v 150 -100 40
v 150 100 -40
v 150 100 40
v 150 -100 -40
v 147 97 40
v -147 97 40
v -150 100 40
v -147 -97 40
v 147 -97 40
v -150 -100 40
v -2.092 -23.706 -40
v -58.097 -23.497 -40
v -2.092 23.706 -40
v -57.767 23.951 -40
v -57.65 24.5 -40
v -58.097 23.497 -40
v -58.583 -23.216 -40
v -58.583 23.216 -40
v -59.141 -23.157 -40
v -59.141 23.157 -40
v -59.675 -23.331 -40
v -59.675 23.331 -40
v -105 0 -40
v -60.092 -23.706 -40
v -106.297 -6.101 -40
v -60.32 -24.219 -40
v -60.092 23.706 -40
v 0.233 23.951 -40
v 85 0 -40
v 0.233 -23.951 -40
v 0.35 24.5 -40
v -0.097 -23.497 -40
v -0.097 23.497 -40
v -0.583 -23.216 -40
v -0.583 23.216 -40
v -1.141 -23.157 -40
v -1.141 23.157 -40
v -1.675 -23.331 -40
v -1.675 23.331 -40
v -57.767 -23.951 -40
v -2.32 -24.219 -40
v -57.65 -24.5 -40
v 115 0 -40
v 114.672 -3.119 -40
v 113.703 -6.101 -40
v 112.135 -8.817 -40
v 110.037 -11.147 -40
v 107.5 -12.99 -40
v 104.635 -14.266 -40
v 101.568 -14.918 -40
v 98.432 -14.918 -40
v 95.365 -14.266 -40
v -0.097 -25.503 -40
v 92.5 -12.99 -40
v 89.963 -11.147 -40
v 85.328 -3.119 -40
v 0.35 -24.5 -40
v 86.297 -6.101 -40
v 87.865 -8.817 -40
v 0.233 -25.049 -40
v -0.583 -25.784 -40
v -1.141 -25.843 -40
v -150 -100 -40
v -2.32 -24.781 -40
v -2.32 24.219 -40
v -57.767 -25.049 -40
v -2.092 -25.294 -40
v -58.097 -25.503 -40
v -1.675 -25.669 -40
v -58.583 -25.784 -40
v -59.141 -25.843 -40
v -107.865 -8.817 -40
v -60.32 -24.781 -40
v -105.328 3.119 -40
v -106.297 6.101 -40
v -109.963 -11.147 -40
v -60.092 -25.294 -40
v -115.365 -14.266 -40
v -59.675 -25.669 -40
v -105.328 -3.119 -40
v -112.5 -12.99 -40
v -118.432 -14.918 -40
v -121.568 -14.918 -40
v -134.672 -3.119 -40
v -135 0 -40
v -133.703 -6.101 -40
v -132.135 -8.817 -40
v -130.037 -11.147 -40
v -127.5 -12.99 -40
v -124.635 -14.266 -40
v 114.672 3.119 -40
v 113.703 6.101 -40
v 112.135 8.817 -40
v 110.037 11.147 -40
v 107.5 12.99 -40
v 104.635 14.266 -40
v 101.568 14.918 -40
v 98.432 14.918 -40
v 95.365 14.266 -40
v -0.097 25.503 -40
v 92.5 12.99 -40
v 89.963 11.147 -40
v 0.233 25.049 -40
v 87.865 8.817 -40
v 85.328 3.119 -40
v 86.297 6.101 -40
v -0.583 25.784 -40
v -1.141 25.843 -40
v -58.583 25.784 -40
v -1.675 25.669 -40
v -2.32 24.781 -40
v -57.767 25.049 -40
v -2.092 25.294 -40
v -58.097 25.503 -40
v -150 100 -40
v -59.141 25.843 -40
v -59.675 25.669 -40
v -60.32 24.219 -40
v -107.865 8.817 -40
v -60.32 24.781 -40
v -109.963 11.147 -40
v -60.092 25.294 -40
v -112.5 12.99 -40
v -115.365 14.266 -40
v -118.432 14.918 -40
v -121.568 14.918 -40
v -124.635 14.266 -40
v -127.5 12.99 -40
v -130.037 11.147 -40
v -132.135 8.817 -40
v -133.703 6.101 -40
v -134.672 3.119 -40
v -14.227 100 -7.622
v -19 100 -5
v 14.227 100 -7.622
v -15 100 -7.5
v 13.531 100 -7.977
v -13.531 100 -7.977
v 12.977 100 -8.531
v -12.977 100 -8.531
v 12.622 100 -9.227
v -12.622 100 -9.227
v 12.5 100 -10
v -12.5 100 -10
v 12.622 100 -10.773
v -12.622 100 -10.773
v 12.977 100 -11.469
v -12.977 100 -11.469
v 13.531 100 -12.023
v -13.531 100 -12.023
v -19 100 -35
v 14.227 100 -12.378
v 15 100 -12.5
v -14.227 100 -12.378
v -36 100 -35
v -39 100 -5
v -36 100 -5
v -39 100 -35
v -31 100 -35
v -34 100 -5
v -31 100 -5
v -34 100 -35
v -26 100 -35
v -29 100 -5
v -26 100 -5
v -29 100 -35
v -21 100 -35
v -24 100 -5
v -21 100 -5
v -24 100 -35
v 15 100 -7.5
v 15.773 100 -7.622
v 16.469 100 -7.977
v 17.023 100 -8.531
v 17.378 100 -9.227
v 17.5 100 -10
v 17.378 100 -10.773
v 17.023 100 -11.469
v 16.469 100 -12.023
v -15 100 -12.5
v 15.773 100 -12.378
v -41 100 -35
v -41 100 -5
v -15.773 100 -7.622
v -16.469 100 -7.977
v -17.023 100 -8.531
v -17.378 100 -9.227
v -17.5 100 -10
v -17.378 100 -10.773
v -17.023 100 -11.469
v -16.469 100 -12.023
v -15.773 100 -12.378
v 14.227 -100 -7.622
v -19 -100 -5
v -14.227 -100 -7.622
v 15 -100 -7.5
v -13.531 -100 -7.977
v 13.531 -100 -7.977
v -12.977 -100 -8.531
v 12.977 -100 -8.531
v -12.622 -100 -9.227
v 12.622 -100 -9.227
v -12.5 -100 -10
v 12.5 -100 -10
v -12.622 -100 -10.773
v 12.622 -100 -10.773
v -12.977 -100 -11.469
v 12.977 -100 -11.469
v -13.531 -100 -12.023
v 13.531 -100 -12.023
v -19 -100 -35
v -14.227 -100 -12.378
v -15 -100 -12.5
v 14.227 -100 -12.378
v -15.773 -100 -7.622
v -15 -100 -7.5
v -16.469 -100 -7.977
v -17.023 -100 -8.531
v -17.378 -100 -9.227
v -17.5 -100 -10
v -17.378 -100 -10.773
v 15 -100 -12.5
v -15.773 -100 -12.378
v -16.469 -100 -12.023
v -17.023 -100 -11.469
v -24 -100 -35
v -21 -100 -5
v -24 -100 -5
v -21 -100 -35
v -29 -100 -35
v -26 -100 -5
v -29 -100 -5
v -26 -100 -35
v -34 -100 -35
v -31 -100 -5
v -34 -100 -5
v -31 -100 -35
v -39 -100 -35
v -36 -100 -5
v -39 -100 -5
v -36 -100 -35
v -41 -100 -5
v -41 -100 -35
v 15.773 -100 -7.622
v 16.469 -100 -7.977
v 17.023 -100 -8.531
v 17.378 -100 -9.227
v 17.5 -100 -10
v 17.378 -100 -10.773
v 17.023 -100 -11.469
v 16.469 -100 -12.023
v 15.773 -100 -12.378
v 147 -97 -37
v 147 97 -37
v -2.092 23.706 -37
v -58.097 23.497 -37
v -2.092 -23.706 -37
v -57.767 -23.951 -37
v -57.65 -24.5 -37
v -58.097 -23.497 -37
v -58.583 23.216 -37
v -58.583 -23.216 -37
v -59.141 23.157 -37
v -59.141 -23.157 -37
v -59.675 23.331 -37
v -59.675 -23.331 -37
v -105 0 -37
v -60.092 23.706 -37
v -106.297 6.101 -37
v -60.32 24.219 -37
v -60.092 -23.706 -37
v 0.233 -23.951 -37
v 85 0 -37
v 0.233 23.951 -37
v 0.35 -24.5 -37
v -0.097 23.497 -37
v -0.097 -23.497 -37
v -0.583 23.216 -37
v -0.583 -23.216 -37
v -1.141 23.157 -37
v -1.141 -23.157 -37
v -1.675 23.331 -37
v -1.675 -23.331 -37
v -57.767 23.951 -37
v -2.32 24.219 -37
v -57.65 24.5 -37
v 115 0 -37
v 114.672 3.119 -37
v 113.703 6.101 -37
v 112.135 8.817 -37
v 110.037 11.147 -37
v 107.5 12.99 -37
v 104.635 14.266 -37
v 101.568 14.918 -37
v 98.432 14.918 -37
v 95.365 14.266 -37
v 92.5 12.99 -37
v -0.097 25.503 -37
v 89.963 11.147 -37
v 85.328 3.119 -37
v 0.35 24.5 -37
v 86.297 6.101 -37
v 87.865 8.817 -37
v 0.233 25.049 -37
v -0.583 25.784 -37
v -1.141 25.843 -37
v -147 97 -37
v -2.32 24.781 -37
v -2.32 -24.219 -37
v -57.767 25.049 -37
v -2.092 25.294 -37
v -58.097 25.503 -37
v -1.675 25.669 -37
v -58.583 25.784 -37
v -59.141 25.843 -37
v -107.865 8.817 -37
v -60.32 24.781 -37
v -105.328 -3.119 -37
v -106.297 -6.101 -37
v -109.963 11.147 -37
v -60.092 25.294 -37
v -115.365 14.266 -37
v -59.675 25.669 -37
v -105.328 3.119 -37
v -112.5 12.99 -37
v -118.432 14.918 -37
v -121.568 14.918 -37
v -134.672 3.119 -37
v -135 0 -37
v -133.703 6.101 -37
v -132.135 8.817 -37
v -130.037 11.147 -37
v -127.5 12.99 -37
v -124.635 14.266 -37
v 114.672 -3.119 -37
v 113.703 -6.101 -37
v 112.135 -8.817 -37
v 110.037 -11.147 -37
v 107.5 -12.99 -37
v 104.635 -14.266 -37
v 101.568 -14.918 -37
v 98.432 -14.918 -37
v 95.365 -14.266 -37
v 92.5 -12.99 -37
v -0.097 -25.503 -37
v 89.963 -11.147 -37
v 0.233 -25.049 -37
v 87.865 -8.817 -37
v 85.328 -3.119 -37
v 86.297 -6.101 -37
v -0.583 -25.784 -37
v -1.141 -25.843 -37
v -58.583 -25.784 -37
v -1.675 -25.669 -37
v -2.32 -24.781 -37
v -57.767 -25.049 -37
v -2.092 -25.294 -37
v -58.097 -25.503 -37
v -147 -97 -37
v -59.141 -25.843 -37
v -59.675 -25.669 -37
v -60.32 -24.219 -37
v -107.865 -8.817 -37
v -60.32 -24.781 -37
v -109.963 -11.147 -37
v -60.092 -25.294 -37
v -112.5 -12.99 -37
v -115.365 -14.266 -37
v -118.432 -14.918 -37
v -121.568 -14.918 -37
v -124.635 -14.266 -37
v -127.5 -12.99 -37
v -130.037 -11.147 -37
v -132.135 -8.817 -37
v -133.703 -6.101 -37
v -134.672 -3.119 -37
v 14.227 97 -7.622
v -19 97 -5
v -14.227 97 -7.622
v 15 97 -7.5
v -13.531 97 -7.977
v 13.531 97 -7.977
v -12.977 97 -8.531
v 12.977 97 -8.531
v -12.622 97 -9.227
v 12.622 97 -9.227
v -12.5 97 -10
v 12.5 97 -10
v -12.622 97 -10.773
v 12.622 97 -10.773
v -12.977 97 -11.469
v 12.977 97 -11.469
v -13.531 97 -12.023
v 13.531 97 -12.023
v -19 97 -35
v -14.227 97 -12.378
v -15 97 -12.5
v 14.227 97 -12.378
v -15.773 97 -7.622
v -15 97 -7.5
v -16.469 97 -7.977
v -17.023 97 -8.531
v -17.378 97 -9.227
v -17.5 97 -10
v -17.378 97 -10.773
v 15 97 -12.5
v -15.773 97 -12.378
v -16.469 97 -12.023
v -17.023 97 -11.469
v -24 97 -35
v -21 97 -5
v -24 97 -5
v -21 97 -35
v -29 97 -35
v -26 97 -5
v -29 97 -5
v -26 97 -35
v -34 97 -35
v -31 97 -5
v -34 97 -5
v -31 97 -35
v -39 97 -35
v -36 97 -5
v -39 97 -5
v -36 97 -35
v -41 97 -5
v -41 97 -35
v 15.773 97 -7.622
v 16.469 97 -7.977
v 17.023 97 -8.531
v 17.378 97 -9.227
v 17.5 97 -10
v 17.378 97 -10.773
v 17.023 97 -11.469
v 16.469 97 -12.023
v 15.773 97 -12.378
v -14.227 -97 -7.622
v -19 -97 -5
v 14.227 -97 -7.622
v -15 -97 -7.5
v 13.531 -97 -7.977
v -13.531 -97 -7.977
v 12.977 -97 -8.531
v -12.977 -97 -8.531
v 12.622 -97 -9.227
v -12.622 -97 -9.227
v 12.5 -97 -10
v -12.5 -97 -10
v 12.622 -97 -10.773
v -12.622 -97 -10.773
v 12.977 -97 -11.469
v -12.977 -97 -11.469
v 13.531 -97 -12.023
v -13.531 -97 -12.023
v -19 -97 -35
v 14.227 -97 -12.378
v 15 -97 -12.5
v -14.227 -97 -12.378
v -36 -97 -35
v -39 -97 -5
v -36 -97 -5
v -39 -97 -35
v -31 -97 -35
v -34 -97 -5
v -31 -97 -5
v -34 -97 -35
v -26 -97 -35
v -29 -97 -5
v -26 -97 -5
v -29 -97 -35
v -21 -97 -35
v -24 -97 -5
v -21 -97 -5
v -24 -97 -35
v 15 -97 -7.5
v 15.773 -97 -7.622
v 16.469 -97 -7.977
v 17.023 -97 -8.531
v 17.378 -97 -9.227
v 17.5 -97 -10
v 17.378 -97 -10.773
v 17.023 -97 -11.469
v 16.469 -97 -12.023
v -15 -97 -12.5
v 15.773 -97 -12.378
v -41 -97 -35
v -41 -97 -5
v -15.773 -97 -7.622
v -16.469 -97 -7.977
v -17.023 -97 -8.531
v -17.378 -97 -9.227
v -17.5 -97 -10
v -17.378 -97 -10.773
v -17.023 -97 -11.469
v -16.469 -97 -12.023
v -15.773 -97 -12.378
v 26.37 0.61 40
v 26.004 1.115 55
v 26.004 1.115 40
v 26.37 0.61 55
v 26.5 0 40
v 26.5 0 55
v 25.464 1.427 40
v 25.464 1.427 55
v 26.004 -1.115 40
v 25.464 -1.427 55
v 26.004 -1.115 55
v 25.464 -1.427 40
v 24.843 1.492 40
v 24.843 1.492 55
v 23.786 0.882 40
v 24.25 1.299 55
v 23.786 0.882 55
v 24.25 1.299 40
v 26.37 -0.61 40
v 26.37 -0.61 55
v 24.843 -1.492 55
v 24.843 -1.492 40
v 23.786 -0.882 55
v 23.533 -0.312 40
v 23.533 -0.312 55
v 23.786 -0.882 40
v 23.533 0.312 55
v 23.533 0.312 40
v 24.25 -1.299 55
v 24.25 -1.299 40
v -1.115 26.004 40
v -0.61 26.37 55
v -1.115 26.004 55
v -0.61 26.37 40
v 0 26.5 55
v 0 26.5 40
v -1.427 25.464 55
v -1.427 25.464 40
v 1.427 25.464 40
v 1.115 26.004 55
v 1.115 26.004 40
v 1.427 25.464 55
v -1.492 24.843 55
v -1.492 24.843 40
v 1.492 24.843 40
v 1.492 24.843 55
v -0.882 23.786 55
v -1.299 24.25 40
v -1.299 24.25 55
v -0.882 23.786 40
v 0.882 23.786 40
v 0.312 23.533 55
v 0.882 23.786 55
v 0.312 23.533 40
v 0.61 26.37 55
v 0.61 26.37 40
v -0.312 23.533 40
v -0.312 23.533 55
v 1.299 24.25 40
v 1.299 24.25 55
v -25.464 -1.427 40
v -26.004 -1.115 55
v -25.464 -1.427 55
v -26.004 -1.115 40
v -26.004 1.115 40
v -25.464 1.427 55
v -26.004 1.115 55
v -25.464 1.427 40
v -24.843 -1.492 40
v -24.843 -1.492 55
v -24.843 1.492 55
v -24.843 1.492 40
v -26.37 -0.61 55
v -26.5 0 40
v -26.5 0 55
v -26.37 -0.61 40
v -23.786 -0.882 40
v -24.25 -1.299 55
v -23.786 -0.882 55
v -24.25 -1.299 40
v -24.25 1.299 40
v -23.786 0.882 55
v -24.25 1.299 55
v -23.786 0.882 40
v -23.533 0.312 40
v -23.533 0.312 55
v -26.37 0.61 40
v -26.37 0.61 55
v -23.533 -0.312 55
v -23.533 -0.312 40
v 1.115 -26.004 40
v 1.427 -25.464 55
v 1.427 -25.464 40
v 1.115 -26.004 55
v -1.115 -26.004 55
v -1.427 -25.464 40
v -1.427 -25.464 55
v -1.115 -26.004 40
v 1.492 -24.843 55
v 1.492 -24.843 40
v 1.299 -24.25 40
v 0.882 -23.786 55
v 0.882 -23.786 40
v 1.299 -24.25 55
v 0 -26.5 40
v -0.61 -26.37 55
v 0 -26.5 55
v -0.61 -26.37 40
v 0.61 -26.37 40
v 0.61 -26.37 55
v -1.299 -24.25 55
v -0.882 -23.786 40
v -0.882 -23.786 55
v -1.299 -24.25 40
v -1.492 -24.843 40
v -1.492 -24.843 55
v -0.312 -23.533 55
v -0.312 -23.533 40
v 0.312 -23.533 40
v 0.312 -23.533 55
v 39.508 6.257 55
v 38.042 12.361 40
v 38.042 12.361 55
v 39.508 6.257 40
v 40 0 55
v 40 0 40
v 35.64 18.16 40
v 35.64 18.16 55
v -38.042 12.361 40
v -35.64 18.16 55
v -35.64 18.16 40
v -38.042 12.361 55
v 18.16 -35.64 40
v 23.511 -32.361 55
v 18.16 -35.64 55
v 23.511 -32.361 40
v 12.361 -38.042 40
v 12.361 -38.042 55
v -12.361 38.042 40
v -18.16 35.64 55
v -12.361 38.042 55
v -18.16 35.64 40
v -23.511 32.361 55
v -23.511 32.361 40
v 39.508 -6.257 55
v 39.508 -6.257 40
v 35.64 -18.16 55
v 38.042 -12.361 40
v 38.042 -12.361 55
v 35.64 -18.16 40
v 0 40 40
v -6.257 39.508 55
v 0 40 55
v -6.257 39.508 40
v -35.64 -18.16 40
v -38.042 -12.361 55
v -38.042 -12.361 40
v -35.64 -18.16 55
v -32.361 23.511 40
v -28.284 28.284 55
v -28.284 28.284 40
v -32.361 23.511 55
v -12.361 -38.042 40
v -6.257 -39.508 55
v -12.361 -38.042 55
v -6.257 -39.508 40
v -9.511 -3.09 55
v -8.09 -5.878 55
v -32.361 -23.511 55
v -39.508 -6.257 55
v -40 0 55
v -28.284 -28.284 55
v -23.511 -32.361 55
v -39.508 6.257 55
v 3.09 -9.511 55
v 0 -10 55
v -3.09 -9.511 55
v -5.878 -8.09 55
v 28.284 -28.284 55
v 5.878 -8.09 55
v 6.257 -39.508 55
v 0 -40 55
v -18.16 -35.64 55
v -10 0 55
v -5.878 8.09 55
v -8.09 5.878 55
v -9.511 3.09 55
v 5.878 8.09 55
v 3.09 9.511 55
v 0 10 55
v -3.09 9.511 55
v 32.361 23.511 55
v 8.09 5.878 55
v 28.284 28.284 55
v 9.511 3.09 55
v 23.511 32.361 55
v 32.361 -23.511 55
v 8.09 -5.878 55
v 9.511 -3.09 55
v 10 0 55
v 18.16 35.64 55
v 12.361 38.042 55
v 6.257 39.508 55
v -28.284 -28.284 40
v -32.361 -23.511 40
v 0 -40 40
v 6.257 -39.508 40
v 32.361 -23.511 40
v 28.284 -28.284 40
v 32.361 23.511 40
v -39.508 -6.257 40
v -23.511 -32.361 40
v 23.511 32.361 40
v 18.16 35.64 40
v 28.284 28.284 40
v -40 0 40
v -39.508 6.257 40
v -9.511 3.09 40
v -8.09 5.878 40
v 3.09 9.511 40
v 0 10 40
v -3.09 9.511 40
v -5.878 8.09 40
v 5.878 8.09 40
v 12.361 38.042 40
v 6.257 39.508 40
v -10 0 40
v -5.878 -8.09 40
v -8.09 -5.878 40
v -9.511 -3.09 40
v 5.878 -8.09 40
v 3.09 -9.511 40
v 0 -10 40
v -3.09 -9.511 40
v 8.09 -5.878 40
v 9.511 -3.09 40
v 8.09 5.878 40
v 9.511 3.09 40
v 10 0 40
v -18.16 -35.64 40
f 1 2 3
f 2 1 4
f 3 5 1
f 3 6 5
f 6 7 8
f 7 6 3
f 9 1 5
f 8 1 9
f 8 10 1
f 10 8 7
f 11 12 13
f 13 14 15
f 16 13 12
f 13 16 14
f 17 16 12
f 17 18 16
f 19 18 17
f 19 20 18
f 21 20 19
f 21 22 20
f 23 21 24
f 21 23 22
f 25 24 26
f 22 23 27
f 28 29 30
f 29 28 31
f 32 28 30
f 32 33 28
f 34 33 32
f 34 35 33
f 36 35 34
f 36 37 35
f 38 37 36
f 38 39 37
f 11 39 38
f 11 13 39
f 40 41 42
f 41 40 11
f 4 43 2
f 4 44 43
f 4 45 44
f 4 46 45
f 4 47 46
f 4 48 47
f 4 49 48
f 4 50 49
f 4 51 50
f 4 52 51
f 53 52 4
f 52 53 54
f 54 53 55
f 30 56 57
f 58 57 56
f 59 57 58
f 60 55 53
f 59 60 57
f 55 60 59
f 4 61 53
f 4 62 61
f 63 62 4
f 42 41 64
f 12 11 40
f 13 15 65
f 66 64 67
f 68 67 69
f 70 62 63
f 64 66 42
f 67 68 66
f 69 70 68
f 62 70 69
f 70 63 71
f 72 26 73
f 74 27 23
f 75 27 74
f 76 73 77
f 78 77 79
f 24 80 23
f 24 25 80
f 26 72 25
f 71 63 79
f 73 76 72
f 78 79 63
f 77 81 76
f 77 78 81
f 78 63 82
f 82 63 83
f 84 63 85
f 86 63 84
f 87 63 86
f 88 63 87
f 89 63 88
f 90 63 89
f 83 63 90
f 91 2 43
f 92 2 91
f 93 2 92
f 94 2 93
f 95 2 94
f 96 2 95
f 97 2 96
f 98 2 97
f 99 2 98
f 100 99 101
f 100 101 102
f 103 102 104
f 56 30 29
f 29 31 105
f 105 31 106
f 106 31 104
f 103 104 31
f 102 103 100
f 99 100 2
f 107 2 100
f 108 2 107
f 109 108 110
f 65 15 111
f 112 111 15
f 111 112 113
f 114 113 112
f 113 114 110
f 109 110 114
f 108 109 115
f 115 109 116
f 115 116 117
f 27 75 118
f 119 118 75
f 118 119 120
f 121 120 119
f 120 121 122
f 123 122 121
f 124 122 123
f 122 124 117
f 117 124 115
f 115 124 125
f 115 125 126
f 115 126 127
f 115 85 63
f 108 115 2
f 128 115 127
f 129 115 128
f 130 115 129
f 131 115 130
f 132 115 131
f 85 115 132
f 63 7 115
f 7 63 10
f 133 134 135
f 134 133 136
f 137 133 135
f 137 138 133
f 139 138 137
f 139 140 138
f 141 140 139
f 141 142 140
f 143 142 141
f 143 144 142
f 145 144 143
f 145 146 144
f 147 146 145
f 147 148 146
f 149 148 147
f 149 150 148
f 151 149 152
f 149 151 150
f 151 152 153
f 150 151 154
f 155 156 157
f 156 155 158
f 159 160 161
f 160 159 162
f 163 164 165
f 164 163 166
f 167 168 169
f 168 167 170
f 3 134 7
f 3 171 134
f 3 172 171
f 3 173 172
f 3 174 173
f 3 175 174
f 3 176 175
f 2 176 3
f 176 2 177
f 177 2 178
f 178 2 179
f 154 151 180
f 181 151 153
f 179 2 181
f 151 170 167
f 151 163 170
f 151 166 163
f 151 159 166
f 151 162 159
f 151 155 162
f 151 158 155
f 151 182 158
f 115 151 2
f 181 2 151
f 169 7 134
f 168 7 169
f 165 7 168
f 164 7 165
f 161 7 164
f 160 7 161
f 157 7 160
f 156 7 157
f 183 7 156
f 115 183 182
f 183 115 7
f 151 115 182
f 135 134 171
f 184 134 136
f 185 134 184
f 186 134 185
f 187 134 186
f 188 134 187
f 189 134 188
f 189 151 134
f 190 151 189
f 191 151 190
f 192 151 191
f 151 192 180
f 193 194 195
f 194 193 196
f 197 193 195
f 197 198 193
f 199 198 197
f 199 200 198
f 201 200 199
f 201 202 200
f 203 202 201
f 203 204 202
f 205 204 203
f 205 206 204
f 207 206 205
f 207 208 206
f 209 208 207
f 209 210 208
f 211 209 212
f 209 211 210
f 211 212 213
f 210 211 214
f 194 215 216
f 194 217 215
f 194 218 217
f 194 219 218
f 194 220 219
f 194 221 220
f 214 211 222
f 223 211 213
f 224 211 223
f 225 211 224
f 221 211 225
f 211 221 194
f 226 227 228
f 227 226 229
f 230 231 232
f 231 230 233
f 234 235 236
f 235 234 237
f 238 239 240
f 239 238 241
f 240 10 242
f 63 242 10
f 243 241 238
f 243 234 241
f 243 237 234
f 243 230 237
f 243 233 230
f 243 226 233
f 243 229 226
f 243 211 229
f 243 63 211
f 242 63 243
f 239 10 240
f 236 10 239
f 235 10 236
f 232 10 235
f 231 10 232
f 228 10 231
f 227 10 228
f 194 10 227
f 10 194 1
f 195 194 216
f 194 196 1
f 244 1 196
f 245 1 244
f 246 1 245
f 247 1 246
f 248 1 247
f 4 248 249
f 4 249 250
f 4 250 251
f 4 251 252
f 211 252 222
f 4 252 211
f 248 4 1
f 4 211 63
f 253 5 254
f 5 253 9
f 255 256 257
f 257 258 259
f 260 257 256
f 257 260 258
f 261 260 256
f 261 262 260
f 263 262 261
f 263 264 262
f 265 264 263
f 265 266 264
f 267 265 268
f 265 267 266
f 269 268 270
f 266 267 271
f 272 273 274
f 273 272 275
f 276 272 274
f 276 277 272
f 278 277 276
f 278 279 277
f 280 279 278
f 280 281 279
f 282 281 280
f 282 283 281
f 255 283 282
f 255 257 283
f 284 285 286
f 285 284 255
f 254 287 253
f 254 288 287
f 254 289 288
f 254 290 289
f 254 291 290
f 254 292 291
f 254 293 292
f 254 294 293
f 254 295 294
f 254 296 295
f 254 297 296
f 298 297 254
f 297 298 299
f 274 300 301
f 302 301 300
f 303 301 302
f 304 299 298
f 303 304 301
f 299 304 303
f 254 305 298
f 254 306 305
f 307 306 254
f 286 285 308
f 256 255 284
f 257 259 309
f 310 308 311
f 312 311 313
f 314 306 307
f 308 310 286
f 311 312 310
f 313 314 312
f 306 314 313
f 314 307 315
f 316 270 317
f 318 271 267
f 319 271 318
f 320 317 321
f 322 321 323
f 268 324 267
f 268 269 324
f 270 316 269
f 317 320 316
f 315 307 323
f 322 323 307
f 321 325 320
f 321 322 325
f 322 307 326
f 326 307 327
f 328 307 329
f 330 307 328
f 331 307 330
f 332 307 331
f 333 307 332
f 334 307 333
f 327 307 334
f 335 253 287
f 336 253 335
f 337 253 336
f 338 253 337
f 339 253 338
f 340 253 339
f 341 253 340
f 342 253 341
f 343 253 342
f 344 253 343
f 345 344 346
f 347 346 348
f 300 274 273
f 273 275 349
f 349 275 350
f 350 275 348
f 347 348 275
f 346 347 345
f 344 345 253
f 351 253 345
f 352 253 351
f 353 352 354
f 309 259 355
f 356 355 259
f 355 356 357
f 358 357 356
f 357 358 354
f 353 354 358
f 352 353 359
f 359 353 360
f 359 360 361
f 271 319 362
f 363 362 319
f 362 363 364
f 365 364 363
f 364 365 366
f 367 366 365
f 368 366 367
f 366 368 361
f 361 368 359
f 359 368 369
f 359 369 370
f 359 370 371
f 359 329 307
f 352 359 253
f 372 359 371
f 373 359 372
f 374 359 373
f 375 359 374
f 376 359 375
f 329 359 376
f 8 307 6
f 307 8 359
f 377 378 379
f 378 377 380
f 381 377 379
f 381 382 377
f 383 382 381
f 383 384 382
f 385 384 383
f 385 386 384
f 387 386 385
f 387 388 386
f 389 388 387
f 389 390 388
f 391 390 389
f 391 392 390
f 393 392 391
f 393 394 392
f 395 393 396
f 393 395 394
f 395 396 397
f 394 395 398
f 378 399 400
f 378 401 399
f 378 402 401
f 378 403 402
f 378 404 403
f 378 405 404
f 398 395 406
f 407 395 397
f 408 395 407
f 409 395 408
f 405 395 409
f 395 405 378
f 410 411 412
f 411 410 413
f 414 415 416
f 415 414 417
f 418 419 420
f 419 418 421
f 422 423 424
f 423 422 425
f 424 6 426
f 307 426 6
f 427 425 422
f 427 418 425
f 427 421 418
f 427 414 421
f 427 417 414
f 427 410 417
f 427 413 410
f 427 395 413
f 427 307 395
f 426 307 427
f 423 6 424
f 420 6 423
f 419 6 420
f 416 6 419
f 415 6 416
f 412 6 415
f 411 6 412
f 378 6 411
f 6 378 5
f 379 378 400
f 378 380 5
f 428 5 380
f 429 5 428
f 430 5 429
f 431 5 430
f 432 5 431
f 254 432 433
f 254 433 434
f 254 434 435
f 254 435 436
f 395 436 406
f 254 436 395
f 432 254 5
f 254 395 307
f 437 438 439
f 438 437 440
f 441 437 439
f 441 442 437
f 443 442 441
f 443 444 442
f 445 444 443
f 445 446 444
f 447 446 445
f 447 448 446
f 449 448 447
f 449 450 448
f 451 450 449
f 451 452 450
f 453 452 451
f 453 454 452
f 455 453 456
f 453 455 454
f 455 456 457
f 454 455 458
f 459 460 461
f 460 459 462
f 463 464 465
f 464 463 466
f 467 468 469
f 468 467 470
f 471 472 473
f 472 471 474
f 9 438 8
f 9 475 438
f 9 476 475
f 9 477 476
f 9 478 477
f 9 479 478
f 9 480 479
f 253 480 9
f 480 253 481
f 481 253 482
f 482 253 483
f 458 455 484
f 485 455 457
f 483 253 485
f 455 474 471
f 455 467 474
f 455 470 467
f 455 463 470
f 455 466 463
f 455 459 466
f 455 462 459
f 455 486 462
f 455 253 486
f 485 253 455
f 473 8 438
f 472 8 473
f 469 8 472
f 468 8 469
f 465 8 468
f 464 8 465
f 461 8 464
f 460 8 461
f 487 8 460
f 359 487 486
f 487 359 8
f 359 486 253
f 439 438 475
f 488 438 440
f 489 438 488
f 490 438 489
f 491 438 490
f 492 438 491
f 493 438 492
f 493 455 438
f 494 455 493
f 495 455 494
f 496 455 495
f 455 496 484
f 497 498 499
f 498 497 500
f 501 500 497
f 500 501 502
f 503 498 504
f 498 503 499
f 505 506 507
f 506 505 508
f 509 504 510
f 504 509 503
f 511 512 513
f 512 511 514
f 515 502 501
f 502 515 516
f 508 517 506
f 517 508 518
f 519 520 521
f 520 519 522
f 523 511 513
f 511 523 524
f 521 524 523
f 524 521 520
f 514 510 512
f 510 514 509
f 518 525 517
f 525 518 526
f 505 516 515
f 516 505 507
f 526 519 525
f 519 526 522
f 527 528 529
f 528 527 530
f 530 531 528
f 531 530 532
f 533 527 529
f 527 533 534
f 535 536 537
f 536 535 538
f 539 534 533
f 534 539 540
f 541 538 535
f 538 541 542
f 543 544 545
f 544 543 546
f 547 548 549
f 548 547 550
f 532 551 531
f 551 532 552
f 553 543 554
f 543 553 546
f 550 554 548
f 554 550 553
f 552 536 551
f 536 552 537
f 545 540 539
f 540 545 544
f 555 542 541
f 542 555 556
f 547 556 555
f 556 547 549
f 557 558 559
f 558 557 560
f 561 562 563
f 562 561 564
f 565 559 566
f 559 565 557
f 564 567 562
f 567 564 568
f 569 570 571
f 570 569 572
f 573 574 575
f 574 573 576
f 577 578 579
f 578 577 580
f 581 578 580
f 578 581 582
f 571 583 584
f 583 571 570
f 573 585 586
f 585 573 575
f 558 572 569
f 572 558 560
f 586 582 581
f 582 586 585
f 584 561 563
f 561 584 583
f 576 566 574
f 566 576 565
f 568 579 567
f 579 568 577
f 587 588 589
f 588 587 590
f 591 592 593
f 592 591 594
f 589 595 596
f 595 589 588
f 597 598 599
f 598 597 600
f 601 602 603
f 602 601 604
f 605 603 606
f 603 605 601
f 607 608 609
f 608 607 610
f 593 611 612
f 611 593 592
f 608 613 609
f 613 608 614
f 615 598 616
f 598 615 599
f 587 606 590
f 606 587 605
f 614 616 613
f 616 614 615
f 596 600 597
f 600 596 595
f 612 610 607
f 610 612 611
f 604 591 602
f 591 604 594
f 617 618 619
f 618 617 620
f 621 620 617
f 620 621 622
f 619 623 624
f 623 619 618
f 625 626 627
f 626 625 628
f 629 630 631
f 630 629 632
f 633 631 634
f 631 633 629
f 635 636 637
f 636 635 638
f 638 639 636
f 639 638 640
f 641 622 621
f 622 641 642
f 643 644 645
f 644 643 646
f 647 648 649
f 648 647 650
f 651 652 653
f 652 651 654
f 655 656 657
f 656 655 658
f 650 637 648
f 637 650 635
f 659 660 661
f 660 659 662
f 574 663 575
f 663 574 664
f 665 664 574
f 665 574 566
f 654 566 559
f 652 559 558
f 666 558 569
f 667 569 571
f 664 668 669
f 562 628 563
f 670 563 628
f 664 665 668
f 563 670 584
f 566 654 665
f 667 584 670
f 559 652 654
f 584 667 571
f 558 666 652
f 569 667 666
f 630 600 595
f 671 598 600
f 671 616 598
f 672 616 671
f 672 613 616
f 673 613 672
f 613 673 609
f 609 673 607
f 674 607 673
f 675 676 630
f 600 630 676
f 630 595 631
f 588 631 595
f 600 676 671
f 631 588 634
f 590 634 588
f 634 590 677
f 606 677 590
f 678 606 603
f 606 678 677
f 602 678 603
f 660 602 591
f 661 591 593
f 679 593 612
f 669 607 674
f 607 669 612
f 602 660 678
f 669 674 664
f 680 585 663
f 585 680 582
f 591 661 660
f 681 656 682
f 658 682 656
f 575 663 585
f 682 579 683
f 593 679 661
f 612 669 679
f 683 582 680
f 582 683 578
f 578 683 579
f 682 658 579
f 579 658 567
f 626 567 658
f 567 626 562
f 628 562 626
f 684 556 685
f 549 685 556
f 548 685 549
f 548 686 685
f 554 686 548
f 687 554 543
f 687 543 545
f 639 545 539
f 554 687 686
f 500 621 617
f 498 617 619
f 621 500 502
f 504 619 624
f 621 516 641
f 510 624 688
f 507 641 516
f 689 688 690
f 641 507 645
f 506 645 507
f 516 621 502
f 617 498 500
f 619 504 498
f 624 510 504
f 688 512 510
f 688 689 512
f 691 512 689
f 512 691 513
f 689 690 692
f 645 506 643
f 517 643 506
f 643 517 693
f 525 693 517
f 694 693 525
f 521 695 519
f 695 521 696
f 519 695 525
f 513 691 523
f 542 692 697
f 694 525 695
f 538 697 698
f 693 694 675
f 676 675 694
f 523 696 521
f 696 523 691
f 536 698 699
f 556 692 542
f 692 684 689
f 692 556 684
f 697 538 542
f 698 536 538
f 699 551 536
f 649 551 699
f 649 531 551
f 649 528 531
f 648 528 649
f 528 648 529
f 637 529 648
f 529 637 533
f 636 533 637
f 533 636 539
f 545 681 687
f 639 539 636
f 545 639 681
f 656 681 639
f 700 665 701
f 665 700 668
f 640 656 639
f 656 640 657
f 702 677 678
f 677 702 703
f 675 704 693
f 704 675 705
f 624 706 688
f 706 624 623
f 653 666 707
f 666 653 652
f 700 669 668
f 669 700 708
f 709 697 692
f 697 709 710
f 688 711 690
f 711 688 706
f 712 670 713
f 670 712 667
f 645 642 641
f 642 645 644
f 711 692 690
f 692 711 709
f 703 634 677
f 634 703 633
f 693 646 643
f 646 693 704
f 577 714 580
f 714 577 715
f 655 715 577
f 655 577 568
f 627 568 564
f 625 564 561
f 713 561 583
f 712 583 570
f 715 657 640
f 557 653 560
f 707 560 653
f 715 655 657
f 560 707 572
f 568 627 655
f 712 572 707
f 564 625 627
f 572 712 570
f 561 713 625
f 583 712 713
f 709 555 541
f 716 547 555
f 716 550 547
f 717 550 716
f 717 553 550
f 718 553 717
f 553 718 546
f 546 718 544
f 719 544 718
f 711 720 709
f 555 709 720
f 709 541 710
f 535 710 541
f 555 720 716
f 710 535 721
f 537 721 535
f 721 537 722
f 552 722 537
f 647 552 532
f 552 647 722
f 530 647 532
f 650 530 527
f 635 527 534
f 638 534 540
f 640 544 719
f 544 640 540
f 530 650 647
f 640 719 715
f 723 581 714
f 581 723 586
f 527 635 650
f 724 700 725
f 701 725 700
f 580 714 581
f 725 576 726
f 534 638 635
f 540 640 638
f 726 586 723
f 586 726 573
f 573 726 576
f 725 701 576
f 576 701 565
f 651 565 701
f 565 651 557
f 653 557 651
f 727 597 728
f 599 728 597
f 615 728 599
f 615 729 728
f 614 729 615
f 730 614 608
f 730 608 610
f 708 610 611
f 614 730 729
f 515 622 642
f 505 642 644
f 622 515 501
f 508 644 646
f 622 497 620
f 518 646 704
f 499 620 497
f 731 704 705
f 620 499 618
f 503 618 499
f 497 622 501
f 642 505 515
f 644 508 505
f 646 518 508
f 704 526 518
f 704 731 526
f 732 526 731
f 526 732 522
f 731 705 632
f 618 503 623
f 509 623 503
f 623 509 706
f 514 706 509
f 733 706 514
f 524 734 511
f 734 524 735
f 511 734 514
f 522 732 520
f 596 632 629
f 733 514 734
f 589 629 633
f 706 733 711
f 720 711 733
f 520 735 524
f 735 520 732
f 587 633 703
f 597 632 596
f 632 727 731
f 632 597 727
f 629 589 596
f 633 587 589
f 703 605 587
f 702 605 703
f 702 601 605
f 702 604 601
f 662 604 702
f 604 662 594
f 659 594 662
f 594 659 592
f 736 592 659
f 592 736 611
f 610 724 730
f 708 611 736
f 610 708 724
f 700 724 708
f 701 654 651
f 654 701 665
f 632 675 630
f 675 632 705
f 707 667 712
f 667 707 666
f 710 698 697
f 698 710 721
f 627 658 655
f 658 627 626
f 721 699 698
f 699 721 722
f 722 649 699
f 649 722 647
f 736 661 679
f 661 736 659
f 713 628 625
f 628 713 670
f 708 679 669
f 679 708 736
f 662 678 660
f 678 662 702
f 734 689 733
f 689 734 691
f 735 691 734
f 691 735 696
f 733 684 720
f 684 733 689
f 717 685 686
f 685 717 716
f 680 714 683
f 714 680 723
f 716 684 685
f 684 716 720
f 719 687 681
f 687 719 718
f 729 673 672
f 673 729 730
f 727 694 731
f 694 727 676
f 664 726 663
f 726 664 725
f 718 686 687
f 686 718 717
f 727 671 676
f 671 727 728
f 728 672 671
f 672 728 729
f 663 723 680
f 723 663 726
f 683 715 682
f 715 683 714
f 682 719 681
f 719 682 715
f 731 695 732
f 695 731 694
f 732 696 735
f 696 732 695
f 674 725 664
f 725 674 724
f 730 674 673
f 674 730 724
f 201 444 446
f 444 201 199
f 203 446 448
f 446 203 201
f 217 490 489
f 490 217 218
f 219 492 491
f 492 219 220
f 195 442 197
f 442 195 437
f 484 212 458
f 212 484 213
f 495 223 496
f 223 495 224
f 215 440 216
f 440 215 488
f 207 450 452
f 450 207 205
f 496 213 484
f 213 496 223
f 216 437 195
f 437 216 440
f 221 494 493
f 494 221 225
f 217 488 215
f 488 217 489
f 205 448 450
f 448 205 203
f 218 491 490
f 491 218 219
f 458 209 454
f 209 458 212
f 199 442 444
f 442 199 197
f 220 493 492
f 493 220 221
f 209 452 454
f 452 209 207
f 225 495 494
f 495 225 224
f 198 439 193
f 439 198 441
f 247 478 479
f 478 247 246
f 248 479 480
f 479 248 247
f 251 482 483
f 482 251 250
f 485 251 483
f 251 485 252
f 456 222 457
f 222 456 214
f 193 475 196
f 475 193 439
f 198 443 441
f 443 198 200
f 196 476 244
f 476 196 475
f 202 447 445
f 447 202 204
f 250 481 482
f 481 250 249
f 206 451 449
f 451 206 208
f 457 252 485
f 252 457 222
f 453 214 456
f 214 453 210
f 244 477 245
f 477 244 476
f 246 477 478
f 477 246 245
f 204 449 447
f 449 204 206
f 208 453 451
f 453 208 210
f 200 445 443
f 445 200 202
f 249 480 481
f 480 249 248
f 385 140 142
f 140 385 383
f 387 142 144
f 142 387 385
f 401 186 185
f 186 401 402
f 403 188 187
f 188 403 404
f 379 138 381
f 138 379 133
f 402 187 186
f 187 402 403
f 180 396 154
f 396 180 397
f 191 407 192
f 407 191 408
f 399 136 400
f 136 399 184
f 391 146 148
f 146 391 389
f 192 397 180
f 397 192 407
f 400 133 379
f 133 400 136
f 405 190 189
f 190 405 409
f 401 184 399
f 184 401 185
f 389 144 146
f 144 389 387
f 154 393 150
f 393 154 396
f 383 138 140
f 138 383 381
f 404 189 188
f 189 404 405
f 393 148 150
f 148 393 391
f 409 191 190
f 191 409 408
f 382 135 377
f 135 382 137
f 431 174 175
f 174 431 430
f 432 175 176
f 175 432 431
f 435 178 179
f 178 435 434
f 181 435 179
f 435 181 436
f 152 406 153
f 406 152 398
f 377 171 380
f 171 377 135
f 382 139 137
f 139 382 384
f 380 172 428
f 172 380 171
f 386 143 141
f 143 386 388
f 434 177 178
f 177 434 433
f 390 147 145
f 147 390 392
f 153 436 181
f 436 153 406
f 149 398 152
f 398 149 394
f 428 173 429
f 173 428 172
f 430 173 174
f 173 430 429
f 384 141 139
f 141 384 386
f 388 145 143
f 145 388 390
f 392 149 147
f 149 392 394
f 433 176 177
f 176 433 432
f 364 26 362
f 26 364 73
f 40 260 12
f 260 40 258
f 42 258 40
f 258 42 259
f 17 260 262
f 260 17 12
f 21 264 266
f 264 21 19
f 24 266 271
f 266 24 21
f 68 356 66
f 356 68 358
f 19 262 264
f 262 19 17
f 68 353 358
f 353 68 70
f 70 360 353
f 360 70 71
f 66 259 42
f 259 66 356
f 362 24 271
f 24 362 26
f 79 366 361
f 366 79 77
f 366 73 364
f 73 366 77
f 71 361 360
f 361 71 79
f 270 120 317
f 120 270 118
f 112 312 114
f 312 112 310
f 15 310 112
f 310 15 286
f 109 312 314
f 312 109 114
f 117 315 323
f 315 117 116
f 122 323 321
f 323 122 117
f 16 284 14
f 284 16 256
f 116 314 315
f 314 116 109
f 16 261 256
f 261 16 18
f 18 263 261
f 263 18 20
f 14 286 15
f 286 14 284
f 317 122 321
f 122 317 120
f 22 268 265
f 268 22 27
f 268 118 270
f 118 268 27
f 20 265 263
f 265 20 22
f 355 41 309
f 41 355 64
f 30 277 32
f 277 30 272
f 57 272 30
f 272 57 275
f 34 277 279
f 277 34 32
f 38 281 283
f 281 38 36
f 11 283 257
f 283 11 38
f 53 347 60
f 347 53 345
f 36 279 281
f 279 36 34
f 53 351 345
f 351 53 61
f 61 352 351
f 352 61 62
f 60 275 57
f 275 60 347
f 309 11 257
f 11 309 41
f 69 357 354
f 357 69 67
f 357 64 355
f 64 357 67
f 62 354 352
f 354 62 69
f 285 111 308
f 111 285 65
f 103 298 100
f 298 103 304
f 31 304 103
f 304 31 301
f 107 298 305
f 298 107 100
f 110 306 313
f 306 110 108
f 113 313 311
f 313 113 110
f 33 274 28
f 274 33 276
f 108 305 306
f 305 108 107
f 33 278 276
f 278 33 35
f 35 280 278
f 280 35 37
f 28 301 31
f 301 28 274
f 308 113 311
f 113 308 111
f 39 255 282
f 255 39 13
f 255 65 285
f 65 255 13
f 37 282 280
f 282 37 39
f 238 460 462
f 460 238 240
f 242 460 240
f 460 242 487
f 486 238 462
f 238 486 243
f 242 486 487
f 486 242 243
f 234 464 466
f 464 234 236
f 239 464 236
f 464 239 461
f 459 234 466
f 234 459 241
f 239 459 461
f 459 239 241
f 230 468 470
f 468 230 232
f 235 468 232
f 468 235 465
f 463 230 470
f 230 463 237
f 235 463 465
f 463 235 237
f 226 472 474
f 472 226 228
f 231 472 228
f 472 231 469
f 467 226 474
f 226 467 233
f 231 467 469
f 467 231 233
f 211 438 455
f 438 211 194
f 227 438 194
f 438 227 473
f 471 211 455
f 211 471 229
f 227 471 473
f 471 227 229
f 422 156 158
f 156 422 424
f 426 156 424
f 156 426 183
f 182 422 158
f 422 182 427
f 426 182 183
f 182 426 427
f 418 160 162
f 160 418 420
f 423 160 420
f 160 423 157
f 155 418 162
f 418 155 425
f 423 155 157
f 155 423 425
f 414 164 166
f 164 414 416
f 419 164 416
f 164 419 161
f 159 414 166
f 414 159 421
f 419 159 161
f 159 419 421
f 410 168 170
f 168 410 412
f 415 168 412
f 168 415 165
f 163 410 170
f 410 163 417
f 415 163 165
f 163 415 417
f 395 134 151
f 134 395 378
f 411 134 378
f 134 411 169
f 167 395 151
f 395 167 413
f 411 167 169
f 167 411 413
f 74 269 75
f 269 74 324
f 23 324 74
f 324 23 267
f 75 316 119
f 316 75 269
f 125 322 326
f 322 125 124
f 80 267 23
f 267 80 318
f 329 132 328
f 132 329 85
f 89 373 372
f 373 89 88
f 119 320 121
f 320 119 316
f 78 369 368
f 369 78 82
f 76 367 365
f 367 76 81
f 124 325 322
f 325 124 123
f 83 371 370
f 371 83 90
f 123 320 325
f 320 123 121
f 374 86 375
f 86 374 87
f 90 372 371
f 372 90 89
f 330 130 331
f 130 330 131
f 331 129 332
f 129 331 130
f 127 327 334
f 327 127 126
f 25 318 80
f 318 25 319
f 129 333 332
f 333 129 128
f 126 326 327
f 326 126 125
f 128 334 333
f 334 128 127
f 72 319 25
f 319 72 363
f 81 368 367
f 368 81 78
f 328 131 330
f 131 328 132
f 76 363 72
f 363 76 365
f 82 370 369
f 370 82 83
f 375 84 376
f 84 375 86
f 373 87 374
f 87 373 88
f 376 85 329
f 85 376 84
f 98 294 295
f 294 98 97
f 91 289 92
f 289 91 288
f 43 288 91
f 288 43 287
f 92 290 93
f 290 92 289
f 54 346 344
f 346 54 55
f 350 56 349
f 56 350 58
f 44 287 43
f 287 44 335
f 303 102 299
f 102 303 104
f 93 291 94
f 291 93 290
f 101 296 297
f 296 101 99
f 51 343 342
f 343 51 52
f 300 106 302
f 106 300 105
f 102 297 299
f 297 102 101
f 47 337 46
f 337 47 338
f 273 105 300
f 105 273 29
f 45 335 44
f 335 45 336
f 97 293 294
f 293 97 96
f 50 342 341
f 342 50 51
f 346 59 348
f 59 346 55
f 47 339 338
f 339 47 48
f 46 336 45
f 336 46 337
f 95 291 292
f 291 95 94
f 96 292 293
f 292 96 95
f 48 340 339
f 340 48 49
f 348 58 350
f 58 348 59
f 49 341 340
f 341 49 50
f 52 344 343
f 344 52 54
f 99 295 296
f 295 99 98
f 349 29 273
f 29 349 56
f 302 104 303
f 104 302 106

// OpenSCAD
/**
 * ============================================================================
 * grass-chopper シャーシ (OpenSCAD パラメトリックモデル)
 * ============================================================================
 * URDF (robot_description.urdf.xacro) の寸法と一致させた
 * 3D プリント用シャーシモデル。
 *
 * 使い方:
 *   1. OpenSCAD でこのファイルを開く
 *   2. パラメータを調整
 *   3. F6 (レンダリング) → File → Export as STL
 *
 * プリント設定 (推奨):
 *   - 素材: ASA (屋外) or PETG (屋内テスト)
 *   - 壁厚: 4〜6 層 (0.4mm ノズルなら 1.6〜2.4mm)
 *   - インフィル: 20% (三角形パターン)
 *   - レイヤー高さ: 0.2mm
 * ============================================================================
 */

// ============================================================================
// パラメータ (URDF と一致)
// ============================================================================

// シャーシ寸法 [mm]
chassis_length = 300;       // X 方向 (前後)
chassis_width  = 200;       // Y 方向 (左右)
chassis_height = 80;        // Z 方向 (高さ)
wall_thickness = 3;         // 壁厚
bottom_thickness = 3;       // 底板厚

// 車輪 [mm]
wheel_radius = 50;          // 車輪半径
wheel_width  = 40;          // 車輪幅
wheel_separation = 240;     // 車輪間距離 (中心間)
wheel_y_offset = wheel_separation / 2;

// モーター [mm] (DC ギアモーター想定)
motor_diameter = 25;        // モーター直径
motor_length   = 60;        // モーター長さ (ギアボックス含む)
motor_shaft_height = 30;    // シャーシ底面からモーター軸中心までの高さ
motor_mount_thickness = 4;  // モーターマウント厚

// キャスター [mm]
caster_radius = 25;         // キャスター半径
caster_x_offset = -120;     // シャーシ中心からの X オフセット (後方)
caster_mount_diameter = 30; // 取り付け穴径

// LiDAR マウント [mm]
lidar_mount_diameter = 70;  // RPLidar A1 の底面直径
lidar_mount_height = 15;    // マウント高さ
lidar_screw_diameter = 3;   // M3 ネジ穴
lidar_screw_spacing = 50;   // ネジ穴間隔

// Pi 5 マウント [mm]
pi_width  = 85;             // Pi 5 基板幅
pi_length = 56;             // Pi 5 基板長さ
pi_screw_diameter = 2.7;    // M2.5 ネジ穴
pi_mount_x = -30;           // シャーシ中心からの X オフセット
pi_mount_y = 0;

// バッテリー収納 [mm]
battery_length = 130;       // 3S LiPo
battery_width  = 45;
battery_height = 25;
battery_x_offset = 50;      // シャーシ前方 (重心調整)

// ヒートセットインサート穴 [mm]
insert_m3_hole = 4.0;       // M3 インサート用穴径
insert_m4_hole = 5.0;       // M4 インサート用穴径
insert_depth = 6;           // インサート埋め込み深さ

// 刃モーターマウント [mm]
blade_motor_diameter = 28;  // BLDC モーター直径
blade_motor_x = 100;        // シャーシ前方

// ============================================================================
// メインモジュール
// ============================================================================

module chassis_base() {
    // 底板 + 側壁の箱型
    difference() {
        // 外形
        cube([chassis_length, chassis_width, chassis_height], center=true);

        // 内部くり抜き
        translate([0, 0, bottom_thickness])
            cube([
                chassis_length - wall_thickness * 2,
                chassis_width  - wall_thickness * 2,
                chassis_height
            ], center=true);
    }
}

module motor_cutout() {
    // モーター貫通穴 (左右)
    for (side = [-1, 1]) {
        translate([0, side * wheel_y_offset, motor_shaft_height - chassis_height/2])
            rotate([0, 90, 0])
                rotate([0, 0, 90])
                    cylinder(h=wall_thickness * 3, d=motor_diameter + 2, center=true);
    }
}

module motor_mount_holes() {
    // モーターマウント用 M4 ネジ穴 (左右各 2 穴)
    for (side = [-1, 1]) {
        for (dx = [-15, 15]) {
            translate([dx, side * (chassis_width/2), motor_shaft_height - chassis_height/2])
                rotate([90, 0, 0])
                    cylinder(h=wall_thickness * 2, d=insert_m4_hole, center=true, $fn=20);
        }
    }
}

module caster_mount_hole() {
    // キャスター取り付け穴
    translate([caster_x_offset, 0, -chassis_height/2])
        cylinder(h=bottom_thickness * 3, d=caster_mount_diameter, center=true, $fn=30);
}

module lidar_mount() {
    // LiDAR マウント台座 (シャーシ上面)
    translate([0, 0, chassis_height/2]) {
        difference() {
            cylinder(h=lidar_mount_height, d=lidar_mount_diameter + 10, $fn=40);

            // 中央穴 (配線通し)
            cylinder(h=lidar_mount_height * 3, d=20, center=true, $fn=20);

            // M3 ネジ穴 × 4
            for (angle = [0, 90, 180, 270]) {
                rotate([0, 0, angle])
                    translate([lidar_screw_spacing/2, 0, 0])
                        cylinder(h=lidar_mount_height * 3, d=lidar_screw_diameter, center=true, $fn=15);
            }
        }
    }
}

module pi_mount_holes() {
    // Raspberry Pi 5 マウント穴 (M2.5 × 4)
    // Pi 5 のネジ穴位置: 49mm × 58mm
    pi_hole_x = 58 / 2;
    pi_hole_y = 49 / 2;

    translate([pi_mount_x, pi_mount_y, -chassis_height/2]) {
        for (dx = [-pi_hole_x, pi_hole_x]) {
            for (dy = [-pi_hole_y, pi_hole_y]) {
                translate([dx, dy, 0])
                    cylinder(h=bottom_thickness * 3, d=pi_screw_diameter, center=true, $fn=15);
            }
        }
    }
}

module battery_compartment() {
    // バッテリー収納エリア (底板にくぼみ)
    translate([battery_x_offset, 0, -chassis_height/2 + bottom_thickness + battery_height/2])
        cube([battery_length + 2, battery_width + 2, battery_height], center=true);
}

module blade_motor_hole() {
    // 刃モーター貫通穴 (底面)
    translate([blade_motor_x, 0, -chassis_height/2])
        cylinder(h=bottom_thickness * 3, d=blade_motor_diameter + 2, center=true, $fn=30);
}

module ventilation_slots() {
    // 通気口 (Pi 5 の排熱用、側面に配置)
    slot_width = 2;
    slot_length = 30;
    num_slots = 5;

    for (side = [-1, 1]) {
        for (i = [0 : num_slots - 1]) {
            translate([
                pi_mount_x + (i - (num_slots-1)/2) * (slot_width + 3),
                side * chassis_width/2,
                20 - chassis_height/2
            ])
                cube([slot_width, wall_thickness * 3, slot_length], center=true);
        }
    }
}

// ============================================================================
// 組み立て
// ============================================================================

module grass_chopper_chassis() {
    difference() {
        union() {
            chassis_base();
            lidar_mount();
        }

        // 穴あけ
        motor_cutout();
        motor_mount_holes();
        caster_mount_hole();
        pi_mount_holes();
        battery_compartment();
        blade_motor_hole();
        ventilation_slots();
    }
}

// レンダリング
grass_chopper_chassis();
